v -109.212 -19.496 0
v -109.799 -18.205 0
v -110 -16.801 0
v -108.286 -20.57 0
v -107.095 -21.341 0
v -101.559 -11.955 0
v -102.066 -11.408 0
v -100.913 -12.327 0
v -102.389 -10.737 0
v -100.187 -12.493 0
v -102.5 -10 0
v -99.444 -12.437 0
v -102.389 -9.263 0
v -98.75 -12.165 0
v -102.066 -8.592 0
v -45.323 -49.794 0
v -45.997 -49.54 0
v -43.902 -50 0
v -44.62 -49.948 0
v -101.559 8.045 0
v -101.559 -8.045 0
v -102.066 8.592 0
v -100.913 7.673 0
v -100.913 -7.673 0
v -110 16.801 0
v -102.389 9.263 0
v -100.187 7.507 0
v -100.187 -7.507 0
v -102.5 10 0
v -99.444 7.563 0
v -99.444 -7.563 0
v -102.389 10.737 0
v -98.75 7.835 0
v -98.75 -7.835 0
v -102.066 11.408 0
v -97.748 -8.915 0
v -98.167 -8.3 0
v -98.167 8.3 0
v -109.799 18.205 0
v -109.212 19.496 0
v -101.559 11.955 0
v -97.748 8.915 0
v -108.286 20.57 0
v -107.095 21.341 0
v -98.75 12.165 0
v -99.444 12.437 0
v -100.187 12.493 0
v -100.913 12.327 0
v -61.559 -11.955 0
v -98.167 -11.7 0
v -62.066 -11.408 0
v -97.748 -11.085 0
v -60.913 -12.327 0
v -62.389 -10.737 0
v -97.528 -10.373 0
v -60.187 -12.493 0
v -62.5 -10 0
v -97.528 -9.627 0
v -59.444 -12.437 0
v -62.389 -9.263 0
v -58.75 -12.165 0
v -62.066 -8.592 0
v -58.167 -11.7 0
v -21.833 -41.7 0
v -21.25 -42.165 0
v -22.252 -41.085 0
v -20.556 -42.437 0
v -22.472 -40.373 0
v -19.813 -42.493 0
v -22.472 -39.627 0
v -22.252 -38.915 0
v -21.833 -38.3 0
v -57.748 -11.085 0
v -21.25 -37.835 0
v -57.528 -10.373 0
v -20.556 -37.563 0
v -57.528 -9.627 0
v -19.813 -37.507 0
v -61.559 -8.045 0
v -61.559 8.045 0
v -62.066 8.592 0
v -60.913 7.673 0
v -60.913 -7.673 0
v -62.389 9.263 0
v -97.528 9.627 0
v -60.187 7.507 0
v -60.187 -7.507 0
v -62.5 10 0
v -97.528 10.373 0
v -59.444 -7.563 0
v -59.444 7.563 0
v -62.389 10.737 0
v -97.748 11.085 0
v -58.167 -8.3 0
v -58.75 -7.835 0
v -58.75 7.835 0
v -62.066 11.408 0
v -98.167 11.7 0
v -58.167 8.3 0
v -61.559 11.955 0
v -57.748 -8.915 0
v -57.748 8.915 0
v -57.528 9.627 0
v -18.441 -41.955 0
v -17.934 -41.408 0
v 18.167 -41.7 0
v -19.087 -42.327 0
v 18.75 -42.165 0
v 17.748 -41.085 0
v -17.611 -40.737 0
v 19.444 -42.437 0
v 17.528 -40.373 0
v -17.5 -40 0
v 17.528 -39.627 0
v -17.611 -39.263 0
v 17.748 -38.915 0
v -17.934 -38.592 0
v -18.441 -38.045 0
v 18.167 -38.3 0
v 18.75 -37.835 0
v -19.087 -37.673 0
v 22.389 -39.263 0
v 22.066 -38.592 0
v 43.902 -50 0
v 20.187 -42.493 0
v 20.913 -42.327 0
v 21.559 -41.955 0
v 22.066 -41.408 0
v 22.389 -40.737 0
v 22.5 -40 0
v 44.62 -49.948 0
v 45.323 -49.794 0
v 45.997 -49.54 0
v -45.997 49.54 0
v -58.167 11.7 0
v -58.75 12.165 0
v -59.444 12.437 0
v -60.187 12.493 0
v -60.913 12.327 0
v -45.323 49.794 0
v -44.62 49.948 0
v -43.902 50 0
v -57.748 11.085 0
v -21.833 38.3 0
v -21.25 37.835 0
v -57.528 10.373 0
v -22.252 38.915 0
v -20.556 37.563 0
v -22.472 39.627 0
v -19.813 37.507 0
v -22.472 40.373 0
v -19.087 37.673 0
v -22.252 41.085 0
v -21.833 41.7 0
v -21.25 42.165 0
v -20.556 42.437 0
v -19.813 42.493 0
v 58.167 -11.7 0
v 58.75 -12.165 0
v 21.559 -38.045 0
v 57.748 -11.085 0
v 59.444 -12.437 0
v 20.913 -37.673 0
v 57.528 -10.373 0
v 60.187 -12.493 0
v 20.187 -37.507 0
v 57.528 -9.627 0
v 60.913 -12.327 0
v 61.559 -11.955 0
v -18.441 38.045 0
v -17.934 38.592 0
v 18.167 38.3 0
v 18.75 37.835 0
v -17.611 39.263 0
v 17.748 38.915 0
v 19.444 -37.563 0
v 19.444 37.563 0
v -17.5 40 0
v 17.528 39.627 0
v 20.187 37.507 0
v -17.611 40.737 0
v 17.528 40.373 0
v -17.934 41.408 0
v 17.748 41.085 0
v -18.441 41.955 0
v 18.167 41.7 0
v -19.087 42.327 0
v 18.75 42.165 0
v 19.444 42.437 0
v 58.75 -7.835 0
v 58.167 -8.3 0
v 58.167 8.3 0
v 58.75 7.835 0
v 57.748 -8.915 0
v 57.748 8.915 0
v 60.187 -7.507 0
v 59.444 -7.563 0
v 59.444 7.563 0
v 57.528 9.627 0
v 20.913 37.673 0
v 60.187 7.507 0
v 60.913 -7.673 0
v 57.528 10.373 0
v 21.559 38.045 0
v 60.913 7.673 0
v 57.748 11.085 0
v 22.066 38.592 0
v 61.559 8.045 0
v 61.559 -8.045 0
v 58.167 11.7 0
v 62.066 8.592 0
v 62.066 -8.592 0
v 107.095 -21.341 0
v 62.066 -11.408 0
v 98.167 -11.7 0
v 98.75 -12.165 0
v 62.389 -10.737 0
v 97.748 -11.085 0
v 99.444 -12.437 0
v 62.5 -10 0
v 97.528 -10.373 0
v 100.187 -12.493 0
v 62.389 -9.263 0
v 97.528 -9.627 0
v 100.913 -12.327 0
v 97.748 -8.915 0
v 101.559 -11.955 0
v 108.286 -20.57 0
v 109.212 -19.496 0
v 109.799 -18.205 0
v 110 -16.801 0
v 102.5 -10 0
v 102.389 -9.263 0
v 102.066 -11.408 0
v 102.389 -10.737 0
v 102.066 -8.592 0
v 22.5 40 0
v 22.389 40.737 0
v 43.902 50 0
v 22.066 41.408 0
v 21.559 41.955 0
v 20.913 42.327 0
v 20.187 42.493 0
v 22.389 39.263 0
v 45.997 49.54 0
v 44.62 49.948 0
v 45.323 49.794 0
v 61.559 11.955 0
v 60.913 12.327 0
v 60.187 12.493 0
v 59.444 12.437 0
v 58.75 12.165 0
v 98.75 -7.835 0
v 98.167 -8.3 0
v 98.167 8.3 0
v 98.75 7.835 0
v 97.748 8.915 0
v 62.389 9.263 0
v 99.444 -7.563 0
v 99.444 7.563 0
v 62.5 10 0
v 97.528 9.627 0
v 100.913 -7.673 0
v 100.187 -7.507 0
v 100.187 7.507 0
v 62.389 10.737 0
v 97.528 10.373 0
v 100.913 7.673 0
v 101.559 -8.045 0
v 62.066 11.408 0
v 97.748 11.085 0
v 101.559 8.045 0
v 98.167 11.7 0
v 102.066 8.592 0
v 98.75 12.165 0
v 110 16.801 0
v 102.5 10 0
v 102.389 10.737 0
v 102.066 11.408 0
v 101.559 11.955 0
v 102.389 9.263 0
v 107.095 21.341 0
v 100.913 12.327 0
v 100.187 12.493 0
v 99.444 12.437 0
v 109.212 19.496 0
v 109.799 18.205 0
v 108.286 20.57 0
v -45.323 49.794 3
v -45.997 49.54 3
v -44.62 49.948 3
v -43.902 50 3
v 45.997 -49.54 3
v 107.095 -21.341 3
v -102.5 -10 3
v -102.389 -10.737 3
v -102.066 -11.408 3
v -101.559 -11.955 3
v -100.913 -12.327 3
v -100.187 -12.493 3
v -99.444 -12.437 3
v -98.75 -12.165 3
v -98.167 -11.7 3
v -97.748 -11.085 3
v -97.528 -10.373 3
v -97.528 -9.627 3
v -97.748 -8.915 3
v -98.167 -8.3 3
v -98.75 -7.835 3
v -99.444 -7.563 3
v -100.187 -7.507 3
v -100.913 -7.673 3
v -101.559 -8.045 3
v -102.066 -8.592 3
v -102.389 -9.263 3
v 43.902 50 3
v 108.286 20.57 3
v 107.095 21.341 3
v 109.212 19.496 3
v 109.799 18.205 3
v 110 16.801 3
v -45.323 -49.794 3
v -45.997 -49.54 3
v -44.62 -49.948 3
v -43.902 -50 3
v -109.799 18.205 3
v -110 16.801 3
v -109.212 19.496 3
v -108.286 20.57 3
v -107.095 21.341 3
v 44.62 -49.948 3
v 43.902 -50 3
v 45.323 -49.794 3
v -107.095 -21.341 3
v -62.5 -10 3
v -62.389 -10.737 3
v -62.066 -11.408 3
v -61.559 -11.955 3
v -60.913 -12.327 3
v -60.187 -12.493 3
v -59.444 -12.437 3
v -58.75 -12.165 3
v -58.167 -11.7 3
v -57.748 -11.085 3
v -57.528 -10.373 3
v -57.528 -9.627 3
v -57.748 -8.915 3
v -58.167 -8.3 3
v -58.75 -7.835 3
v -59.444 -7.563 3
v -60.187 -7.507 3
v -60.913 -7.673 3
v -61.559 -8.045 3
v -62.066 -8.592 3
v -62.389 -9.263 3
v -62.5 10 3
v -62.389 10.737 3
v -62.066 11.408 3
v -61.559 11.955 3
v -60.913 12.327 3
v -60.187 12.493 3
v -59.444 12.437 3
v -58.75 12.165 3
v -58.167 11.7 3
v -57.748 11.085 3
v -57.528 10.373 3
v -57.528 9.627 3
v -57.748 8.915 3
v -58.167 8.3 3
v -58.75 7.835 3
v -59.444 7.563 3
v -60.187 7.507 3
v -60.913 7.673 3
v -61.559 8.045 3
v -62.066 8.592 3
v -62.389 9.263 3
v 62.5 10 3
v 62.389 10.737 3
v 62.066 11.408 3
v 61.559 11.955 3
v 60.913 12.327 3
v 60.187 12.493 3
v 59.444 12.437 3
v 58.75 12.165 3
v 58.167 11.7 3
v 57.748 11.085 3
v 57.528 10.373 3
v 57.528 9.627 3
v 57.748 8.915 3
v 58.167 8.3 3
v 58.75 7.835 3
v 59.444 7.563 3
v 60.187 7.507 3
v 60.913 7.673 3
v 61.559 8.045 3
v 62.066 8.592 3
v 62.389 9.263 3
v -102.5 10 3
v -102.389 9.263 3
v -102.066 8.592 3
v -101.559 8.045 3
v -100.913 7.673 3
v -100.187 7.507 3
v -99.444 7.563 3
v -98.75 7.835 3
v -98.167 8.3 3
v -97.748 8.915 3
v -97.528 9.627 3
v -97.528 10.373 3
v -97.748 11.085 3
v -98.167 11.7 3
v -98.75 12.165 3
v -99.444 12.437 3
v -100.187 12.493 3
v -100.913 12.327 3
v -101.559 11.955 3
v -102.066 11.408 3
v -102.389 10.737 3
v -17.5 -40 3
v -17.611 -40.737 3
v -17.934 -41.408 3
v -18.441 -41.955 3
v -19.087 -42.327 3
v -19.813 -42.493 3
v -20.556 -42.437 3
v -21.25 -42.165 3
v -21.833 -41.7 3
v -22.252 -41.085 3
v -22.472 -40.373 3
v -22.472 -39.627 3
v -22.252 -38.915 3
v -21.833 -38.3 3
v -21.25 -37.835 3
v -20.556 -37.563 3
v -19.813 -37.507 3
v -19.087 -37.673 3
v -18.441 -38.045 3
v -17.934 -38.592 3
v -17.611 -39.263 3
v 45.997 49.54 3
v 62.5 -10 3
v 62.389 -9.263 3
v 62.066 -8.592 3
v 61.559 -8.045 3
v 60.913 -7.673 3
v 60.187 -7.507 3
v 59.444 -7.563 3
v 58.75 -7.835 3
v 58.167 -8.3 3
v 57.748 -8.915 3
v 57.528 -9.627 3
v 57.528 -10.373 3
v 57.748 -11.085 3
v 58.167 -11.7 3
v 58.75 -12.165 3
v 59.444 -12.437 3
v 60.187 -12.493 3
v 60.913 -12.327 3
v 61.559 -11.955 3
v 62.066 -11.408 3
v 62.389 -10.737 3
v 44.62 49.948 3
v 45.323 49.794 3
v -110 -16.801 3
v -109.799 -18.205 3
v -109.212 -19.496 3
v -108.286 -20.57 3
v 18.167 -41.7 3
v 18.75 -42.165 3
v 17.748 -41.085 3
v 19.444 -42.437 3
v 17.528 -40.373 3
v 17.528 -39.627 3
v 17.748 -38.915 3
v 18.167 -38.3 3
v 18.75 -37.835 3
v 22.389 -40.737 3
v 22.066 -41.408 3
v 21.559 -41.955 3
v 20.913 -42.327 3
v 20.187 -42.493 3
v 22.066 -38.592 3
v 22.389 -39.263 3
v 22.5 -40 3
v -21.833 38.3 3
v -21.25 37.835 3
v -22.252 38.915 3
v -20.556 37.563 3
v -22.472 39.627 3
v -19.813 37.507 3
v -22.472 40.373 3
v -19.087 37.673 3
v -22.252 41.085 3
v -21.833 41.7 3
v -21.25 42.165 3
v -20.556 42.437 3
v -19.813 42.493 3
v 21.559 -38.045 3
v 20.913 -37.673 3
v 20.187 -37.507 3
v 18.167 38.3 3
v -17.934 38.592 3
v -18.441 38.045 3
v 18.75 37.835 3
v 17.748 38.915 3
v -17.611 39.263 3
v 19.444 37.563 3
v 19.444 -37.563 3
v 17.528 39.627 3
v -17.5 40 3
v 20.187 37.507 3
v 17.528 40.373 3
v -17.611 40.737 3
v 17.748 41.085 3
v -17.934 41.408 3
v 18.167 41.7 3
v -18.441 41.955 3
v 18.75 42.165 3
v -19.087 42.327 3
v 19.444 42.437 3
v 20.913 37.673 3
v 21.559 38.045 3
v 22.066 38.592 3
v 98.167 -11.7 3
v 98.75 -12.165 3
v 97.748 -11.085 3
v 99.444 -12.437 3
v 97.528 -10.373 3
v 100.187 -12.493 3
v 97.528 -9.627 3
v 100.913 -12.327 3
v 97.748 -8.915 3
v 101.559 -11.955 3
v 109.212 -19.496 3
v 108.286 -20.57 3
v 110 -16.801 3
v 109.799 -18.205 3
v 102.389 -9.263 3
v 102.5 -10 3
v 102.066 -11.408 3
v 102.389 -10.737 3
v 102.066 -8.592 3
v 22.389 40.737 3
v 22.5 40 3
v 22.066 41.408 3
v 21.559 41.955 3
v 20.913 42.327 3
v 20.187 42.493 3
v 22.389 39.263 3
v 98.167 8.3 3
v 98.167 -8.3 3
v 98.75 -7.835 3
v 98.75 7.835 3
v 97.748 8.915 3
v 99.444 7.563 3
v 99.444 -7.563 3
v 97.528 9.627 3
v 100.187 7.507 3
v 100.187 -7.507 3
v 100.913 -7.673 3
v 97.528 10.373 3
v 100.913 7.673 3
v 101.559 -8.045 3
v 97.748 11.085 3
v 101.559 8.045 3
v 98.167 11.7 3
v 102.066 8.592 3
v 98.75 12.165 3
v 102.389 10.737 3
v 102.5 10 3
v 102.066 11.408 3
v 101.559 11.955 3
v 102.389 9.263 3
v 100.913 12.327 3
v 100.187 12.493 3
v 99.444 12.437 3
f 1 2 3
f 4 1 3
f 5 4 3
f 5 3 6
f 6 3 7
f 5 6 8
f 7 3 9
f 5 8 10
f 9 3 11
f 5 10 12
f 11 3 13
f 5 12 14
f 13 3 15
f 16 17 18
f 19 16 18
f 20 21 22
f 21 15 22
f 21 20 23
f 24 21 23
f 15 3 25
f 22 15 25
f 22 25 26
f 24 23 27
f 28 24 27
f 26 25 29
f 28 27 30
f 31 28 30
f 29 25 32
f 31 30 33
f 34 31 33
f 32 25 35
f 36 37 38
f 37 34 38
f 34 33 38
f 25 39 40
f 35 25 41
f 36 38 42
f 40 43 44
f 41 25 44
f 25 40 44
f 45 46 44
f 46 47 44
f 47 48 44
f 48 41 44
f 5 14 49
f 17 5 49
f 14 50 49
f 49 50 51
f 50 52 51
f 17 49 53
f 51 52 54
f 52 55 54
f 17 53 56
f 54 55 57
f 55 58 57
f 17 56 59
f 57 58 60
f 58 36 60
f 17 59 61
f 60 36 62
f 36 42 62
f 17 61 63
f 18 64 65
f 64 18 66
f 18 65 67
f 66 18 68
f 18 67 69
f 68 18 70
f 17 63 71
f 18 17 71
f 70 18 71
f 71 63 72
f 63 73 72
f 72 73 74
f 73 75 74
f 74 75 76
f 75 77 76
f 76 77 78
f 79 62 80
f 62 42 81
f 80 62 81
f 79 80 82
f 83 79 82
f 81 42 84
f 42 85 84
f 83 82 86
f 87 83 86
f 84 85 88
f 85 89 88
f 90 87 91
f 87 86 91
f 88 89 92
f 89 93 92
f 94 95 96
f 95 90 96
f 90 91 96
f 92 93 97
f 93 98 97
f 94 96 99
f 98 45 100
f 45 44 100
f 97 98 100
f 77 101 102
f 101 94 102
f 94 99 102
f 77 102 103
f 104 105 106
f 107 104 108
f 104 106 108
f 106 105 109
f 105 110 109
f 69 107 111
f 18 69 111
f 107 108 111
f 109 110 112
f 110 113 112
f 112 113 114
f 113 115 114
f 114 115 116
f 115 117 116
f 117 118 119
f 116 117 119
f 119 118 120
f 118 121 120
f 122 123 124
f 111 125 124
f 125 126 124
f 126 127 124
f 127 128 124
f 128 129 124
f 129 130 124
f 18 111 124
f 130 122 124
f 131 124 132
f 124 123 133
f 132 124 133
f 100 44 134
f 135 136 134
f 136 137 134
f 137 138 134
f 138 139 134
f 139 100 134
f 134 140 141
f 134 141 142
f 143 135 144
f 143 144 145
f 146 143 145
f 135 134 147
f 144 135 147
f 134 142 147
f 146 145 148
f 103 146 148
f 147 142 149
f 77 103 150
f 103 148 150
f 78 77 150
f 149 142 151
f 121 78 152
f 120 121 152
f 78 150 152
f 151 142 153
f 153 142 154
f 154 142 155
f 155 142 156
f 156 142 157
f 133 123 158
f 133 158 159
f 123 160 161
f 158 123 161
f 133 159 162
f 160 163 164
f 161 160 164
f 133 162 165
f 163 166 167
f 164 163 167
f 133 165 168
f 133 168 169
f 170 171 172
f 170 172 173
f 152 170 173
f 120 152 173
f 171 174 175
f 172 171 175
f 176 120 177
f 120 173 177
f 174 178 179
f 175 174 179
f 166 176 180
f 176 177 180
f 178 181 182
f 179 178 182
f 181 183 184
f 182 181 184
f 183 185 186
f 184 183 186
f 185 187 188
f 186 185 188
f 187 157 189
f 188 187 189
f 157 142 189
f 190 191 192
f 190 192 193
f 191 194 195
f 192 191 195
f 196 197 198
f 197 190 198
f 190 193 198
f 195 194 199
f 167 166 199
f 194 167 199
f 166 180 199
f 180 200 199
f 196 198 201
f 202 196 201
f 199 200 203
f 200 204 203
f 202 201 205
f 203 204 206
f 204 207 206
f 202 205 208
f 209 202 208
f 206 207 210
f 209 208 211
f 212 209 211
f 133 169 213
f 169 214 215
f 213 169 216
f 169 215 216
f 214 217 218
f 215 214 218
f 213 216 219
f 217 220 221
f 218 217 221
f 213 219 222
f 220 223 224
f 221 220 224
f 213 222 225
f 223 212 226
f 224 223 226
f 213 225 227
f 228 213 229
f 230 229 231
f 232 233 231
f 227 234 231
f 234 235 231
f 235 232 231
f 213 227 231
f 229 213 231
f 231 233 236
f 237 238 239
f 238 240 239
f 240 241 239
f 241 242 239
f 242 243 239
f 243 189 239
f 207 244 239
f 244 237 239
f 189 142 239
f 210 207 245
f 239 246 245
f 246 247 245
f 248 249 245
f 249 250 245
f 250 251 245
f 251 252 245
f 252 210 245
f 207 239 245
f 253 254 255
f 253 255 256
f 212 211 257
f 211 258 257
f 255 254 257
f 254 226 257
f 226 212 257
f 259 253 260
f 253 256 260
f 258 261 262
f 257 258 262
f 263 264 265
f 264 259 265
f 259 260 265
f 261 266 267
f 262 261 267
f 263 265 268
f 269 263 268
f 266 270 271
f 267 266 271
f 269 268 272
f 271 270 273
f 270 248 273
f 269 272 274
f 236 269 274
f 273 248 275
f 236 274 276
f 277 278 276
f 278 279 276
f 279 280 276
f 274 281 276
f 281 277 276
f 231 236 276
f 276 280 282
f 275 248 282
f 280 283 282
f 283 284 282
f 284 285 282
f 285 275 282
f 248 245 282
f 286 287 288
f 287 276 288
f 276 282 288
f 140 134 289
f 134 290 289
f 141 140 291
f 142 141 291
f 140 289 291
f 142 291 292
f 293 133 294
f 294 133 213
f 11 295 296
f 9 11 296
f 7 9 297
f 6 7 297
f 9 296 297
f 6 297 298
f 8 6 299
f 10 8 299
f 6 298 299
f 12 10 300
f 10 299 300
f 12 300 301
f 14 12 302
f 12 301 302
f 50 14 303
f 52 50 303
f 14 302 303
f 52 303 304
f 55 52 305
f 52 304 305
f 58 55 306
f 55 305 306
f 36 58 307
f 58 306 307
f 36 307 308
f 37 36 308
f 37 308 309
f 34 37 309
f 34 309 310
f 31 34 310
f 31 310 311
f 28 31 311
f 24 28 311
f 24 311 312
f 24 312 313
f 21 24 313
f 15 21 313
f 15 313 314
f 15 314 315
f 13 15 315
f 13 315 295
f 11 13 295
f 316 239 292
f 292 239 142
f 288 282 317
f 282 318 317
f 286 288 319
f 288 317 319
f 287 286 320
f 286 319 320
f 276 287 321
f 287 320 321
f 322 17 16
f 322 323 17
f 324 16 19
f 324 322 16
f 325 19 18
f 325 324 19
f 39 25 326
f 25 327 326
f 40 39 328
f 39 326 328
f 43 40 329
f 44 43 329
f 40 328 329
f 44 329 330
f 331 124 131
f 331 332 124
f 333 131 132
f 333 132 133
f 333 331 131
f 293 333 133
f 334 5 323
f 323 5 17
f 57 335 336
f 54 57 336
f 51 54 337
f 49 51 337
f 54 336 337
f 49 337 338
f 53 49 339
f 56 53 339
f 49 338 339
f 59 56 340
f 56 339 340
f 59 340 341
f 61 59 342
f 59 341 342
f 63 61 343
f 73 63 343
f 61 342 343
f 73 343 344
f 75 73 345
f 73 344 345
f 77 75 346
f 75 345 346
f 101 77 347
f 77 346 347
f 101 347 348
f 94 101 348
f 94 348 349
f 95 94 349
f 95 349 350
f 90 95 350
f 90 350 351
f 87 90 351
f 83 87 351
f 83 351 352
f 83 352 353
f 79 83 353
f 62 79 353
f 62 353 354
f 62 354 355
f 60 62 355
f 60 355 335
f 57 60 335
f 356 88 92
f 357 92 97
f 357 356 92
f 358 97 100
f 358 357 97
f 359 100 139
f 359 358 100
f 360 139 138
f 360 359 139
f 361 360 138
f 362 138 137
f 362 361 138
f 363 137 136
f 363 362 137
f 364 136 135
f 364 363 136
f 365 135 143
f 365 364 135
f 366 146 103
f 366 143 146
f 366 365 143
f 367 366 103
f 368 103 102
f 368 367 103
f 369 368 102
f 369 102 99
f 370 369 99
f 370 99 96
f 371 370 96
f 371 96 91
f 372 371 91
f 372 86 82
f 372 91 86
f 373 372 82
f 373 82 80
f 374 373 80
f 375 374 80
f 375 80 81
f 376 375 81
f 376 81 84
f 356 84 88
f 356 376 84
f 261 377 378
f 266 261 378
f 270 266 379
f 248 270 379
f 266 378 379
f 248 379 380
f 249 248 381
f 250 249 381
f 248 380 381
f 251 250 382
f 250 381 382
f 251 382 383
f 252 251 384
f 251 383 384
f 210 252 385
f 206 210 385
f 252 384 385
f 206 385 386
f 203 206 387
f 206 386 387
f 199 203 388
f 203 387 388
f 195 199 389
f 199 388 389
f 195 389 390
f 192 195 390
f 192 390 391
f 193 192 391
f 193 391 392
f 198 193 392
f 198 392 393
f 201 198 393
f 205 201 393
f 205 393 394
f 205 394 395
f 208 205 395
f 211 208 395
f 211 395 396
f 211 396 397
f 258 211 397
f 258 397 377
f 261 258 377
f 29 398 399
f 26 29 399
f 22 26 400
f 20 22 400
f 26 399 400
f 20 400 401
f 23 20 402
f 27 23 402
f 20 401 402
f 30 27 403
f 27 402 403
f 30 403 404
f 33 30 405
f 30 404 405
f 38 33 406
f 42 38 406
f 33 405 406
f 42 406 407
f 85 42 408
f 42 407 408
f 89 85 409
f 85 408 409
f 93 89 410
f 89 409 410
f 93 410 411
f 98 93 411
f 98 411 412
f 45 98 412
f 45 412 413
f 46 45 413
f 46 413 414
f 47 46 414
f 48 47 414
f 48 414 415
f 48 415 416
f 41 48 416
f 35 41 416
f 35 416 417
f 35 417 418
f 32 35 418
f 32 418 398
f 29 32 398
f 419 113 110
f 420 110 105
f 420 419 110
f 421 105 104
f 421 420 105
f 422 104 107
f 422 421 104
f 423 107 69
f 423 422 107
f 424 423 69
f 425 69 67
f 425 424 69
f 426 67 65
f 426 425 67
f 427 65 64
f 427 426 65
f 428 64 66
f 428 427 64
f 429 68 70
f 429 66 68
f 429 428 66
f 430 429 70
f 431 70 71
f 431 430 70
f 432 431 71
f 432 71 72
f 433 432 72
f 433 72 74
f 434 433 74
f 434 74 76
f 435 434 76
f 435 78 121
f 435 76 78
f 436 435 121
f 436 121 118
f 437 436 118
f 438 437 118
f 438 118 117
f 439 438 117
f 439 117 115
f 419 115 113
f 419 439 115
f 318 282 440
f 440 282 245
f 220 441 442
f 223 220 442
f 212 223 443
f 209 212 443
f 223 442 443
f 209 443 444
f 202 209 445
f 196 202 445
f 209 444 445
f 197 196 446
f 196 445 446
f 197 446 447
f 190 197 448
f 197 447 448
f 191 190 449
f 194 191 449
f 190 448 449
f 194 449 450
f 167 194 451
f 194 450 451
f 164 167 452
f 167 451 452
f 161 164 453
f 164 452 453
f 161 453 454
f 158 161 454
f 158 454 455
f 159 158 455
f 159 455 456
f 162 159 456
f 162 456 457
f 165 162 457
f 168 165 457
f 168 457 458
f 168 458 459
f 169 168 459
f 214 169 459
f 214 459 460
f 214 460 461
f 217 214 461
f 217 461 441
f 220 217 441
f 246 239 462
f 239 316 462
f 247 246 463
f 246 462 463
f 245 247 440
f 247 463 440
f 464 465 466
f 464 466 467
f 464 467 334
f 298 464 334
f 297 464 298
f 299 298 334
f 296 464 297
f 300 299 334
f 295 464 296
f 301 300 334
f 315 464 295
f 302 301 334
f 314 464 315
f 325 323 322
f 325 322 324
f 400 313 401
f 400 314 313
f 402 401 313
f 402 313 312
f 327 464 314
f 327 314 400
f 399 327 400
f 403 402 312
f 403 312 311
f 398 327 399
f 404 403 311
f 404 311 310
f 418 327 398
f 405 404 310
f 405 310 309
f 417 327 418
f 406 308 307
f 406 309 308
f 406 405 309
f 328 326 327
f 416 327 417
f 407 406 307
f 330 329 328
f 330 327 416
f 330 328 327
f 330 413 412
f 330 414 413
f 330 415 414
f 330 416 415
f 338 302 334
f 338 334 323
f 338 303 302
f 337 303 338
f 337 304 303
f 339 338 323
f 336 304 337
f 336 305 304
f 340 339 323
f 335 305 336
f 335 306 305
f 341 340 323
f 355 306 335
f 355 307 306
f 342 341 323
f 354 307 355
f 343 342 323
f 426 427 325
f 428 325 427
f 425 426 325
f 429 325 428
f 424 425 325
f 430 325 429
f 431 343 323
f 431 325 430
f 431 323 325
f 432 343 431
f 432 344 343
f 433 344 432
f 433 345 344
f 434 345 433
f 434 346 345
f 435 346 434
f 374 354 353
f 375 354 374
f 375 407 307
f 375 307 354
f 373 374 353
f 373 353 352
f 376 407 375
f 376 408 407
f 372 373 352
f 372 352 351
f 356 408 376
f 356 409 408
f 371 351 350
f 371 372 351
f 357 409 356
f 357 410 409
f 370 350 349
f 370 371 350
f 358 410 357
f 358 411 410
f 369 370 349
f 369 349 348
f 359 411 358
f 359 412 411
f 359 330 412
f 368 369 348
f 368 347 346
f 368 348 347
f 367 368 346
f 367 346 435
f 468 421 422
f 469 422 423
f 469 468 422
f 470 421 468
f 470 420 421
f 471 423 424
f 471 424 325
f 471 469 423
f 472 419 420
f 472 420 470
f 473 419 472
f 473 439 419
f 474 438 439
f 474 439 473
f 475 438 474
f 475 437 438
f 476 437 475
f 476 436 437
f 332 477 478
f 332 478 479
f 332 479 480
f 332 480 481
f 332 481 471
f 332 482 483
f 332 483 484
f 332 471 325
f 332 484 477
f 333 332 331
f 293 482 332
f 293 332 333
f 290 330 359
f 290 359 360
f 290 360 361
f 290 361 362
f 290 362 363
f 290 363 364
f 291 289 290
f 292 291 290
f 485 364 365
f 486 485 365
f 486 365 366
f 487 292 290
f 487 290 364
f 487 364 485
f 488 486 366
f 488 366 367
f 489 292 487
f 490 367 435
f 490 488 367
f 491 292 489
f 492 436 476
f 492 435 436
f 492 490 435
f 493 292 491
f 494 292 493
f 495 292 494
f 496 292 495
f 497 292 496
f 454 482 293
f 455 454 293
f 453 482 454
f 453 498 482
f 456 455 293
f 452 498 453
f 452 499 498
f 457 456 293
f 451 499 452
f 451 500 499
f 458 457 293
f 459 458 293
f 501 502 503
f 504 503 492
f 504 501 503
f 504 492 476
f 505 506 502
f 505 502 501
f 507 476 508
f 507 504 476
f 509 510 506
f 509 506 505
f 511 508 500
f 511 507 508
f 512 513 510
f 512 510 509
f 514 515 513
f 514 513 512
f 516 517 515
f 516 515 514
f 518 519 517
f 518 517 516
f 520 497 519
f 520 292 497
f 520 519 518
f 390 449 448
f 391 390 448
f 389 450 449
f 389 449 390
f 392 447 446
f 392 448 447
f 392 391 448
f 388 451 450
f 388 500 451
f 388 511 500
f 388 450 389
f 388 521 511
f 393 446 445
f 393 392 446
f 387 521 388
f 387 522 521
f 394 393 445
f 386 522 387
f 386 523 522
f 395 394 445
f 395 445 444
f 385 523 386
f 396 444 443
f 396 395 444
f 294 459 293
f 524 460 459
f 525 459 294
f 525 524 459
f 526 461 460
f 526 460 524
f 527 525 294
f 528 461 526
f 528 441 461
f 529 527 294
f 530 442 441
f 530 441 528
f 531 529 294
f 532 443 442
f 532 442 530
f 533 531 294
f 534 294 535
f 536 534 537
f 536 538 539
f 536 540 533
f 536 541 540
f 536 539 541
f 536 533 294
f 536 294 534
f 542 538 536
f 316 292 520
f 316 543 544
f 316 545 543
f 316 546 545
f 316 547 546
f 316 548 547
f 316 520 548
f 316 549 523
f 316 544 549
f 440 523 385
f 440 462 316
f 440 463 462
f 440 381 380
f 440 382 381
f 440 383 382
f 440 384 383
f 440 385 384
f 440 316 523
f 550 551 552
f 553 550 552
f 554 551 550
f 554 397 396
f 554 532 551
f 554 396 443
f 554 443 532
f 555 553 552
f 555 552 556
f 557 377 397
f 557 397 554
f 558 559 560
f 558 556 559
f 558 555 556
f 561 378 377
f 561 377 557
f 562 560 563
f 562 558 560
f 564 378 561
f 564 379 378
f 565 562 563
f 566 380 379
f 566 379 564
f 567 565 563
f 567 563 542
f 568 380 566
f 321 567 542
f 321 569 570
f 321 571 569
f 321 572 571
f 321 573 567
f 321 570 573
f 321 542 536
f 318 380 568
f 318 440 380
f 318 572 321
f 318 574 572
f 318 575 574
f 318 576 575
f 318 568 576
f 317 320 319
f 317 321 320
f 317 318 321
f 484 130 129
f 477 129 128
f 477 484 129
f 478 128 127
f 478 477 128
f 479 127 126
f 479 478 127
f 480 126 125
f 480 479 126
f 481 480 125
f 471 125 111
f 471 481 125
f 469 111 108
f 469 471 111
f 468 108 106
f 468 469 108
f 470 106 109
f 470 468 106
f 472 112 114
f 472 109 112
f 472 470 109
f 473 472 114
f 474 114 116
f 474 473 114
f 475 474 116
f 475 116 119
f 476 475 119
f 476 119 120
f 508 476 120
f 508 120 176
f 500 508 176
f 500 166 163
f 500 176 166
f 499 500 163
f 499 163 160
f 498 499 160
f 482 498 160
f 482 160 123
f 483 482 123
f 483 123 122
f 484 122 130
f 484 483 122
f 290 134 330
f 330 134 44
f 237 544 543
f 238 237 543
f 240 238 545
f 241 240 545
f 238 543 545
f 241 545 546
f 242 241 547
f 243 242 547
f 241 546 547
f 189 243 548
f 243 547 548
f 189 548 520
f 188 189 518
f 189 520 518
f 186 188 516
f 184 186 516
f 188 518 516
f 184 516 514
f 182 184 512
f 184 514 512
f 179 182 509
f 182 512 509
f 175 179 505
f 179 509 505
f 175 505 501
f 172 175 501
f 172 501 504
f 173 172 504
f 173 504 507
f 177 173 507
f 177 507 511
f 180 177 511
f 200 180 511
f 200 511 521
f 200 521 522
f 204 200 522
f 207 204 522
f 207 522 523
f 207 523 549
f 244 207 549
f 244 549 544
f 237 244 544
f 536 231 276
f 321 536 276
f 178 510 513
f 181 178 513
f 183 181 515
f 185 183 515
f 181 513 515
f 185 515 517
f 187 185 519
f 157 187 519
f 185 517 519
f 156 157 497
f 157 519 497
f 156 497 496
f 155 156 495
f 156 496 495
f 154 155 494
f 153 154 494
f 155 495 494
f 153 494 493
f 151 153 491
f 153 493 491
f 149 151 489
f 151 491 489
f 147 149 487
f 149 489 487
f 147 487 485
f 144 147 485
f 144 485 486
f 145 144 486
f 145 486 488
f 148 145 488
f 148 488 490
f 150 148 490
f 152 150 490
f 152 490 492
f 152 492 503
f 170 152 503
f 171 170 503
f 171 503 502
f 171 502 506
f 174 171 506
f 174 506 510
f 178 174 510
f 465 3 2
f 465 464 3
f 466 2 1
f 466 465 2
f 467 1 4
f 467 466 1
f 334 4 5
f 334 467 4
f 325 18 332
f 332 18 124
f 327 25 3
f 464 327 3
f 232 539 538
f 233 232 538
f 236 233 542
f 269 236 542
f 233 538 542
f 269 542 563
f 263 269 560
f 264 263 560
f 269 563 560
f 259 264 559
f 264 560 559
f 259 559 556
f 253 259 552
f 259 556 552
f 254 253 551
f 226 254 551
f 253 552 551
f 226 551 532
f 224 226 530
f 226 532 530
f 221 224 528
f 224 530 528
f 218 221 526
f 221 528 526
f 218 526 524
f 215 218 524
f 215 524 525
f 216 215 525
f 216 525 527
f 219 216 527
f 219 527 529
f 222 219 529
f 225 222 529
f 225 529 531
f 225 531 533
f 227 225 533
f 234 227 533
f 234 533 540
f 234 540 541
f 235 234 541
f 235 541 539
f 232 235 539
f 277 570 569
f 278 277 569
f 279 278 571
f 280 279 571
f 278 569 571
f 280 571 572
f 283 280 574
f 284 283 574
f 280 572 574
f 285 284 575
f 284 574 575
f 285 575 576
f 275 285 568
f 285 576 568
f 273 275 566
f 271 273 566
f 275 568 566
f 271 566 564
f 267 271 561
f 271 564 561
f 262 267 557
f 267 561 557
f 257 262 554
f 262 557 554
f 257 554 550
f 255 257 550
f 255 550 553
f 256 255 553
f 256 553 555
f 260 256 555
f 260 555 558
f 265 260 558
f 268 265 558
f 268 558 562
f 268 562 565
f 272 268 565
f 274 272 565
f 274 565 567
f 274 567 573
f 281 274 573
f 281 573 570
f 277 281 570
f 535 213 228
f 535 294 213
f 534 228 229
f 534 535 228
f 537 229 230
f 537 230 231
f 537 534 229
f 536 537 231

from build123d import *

# Parameters (mm, degrees)
BOSS_EXTRUDE1_DEPTH     = 3
SKETCH2_R               = 2.5
CUT_EXTRUDE1_DEPTH      = 4
LPATTERN1_COUNT         = 2
LPATTERN1_PITCH         = 40
LPATTERN1_COUNT_DIR2    = 2
LPATTERN1_PITCH_DIR2    = 20
MIRROR1_COPY_1_SKETCH_R = 2.5
MIRROR1_COPY_1_DEPTH    = 4
MIRROR1_COPY_2_SKETCH_R = 2.5
MIRROR1_COPY_2_DEPTH    = 4
MIRROR1_COPY_3_SKETCH_R = 2.5
MIRROR1_COPY_3_DEPTH    = 4
SKETCH3_R               = 2.5
CUT_EXTRUDE2_DEPTH      = 4
FILLET1_R               = 5


with BuildPart() as part:
    # Sketch1 → Boss-Extrude1 (new body)
    with BuildSketch(Plane.XY):
        Polygon((-110, 20), (-110, -20), (-45, -50), (45, -50), (110, -20), (110, 20), (45, 50), (-45, 50), align=None)
    extrude(amount=BOSS_EXTRUDE1_DEPTH)

    # Sketch2 → Cut-Extrude1 (cut, through all)
    with BuildSketch(Plane.XY.offset(3)):
        with Locations((60, 10)):
            Circle(SKETCH2_R)
    cut_extrude1 = extrude(amount=-CUT_EXTRUDE1_DEPTH, mode=Mode.SUBTRACT)

    # LPattern1: Cut-Extrude1 2 × 2
    with Locations(*[(i * LPATTERN1_PITCH, -j * LPATTERN1_PITCH_DIR2, 0) for i in range(LPATTERN1_COUNT) for j in range(LPATTERN1_COUNT_DIR2) if (i, j) != (0, 0)]):
        add(cut_extrude1, mode=Mode.SUBTRACT)

    # Mirror1: Cut-Extrude1 across plane
    add(cut_extrude1.mirror(Plane(origin=(0, 0, 0), x_dir=(0, 0, 1), z_dir=(1, 0, 0))), mode=Mode.SUBTRACT)

    # Mirror1 copy 1 sketch → Mirror1 copy 1 (cut, through all)
    with BuildSketch(Plane(origin=(0, -20, 3), x_dir=(-1, 0, 0), z_dir=(0, 0, 1))):
        with Locations((60, -10)):
            Circle(MIRROR1_COPY_1_SKETCH_R)
    extrude(amount=-MIRROR1_COPY_1_DEPTH, mode=Mode.SUBTRACT)

    # Mirror1 copy 2 sketch → Mirror1 copy 2 (cut, through all)
    with BuildSketch(Plane(origin=(-40, 0, 3), x_dir=(-1, 0, 0), z_dir=(0, 0, 1))):
        with Locations((60, -10)):
            Circle(MIRROR1_COPY_2_SKETCH_R)
    extrude(amount=-MIRROR1_COPY_2_DEPTH, mode=Mode.SUBTRACT)

    # Mirror1 copy 3 sketch → Mirror1 copy 3 (cut, through all)
    with BuildSketch(Plane(origin=(-40, -20, 3), x_dir=(-1, 0, 0), z_dir=(0, 0, 1))):
        with Locations((60, -10)):
            Circle(MIRROR1_COPY_3_SKETCH_R)
    extrude(amount=-MIRROR1_COPY_3_DEPTH, mode=Mode.SUBTRACT)

    # Sketch3 → Cut-Extrude2 (cut, through all)
    with BuildSketch(Plane.XY.offset(3)):
        with Locations((20, 40)):
            Circle(SKETCH3_R)
        with Locations((-20, 40)):
            Circle(SKETCH3_R)
    cut_extrude2 = extrude(amount=-CUT_EXTRUDE2_DEPTH, mode=Mode.SUBTRACT)

    # Mirror2: Cut-Extrude2 across plane
    add(cut_extrude2.mirror(Plane.ZX), mode=Mode.SUBTRACT)

    # Fillet1
    fillet1_edges = [part.edges().sort_by_distance(p)[0] for p in [
        (-45, 50, 1.5),
        (45, 50, 1.5),
        (110, 20, 1.5),
        (110, -20, 1.5),
        (45, -50, 1.5),
        (-45, -50, 1.5),
        (-110, -20, 1.5),
        (-110, 20, 1.5),
    ]]
    fillet(fillet1_edges, radius=FILLET1_R)


solid = part.part
